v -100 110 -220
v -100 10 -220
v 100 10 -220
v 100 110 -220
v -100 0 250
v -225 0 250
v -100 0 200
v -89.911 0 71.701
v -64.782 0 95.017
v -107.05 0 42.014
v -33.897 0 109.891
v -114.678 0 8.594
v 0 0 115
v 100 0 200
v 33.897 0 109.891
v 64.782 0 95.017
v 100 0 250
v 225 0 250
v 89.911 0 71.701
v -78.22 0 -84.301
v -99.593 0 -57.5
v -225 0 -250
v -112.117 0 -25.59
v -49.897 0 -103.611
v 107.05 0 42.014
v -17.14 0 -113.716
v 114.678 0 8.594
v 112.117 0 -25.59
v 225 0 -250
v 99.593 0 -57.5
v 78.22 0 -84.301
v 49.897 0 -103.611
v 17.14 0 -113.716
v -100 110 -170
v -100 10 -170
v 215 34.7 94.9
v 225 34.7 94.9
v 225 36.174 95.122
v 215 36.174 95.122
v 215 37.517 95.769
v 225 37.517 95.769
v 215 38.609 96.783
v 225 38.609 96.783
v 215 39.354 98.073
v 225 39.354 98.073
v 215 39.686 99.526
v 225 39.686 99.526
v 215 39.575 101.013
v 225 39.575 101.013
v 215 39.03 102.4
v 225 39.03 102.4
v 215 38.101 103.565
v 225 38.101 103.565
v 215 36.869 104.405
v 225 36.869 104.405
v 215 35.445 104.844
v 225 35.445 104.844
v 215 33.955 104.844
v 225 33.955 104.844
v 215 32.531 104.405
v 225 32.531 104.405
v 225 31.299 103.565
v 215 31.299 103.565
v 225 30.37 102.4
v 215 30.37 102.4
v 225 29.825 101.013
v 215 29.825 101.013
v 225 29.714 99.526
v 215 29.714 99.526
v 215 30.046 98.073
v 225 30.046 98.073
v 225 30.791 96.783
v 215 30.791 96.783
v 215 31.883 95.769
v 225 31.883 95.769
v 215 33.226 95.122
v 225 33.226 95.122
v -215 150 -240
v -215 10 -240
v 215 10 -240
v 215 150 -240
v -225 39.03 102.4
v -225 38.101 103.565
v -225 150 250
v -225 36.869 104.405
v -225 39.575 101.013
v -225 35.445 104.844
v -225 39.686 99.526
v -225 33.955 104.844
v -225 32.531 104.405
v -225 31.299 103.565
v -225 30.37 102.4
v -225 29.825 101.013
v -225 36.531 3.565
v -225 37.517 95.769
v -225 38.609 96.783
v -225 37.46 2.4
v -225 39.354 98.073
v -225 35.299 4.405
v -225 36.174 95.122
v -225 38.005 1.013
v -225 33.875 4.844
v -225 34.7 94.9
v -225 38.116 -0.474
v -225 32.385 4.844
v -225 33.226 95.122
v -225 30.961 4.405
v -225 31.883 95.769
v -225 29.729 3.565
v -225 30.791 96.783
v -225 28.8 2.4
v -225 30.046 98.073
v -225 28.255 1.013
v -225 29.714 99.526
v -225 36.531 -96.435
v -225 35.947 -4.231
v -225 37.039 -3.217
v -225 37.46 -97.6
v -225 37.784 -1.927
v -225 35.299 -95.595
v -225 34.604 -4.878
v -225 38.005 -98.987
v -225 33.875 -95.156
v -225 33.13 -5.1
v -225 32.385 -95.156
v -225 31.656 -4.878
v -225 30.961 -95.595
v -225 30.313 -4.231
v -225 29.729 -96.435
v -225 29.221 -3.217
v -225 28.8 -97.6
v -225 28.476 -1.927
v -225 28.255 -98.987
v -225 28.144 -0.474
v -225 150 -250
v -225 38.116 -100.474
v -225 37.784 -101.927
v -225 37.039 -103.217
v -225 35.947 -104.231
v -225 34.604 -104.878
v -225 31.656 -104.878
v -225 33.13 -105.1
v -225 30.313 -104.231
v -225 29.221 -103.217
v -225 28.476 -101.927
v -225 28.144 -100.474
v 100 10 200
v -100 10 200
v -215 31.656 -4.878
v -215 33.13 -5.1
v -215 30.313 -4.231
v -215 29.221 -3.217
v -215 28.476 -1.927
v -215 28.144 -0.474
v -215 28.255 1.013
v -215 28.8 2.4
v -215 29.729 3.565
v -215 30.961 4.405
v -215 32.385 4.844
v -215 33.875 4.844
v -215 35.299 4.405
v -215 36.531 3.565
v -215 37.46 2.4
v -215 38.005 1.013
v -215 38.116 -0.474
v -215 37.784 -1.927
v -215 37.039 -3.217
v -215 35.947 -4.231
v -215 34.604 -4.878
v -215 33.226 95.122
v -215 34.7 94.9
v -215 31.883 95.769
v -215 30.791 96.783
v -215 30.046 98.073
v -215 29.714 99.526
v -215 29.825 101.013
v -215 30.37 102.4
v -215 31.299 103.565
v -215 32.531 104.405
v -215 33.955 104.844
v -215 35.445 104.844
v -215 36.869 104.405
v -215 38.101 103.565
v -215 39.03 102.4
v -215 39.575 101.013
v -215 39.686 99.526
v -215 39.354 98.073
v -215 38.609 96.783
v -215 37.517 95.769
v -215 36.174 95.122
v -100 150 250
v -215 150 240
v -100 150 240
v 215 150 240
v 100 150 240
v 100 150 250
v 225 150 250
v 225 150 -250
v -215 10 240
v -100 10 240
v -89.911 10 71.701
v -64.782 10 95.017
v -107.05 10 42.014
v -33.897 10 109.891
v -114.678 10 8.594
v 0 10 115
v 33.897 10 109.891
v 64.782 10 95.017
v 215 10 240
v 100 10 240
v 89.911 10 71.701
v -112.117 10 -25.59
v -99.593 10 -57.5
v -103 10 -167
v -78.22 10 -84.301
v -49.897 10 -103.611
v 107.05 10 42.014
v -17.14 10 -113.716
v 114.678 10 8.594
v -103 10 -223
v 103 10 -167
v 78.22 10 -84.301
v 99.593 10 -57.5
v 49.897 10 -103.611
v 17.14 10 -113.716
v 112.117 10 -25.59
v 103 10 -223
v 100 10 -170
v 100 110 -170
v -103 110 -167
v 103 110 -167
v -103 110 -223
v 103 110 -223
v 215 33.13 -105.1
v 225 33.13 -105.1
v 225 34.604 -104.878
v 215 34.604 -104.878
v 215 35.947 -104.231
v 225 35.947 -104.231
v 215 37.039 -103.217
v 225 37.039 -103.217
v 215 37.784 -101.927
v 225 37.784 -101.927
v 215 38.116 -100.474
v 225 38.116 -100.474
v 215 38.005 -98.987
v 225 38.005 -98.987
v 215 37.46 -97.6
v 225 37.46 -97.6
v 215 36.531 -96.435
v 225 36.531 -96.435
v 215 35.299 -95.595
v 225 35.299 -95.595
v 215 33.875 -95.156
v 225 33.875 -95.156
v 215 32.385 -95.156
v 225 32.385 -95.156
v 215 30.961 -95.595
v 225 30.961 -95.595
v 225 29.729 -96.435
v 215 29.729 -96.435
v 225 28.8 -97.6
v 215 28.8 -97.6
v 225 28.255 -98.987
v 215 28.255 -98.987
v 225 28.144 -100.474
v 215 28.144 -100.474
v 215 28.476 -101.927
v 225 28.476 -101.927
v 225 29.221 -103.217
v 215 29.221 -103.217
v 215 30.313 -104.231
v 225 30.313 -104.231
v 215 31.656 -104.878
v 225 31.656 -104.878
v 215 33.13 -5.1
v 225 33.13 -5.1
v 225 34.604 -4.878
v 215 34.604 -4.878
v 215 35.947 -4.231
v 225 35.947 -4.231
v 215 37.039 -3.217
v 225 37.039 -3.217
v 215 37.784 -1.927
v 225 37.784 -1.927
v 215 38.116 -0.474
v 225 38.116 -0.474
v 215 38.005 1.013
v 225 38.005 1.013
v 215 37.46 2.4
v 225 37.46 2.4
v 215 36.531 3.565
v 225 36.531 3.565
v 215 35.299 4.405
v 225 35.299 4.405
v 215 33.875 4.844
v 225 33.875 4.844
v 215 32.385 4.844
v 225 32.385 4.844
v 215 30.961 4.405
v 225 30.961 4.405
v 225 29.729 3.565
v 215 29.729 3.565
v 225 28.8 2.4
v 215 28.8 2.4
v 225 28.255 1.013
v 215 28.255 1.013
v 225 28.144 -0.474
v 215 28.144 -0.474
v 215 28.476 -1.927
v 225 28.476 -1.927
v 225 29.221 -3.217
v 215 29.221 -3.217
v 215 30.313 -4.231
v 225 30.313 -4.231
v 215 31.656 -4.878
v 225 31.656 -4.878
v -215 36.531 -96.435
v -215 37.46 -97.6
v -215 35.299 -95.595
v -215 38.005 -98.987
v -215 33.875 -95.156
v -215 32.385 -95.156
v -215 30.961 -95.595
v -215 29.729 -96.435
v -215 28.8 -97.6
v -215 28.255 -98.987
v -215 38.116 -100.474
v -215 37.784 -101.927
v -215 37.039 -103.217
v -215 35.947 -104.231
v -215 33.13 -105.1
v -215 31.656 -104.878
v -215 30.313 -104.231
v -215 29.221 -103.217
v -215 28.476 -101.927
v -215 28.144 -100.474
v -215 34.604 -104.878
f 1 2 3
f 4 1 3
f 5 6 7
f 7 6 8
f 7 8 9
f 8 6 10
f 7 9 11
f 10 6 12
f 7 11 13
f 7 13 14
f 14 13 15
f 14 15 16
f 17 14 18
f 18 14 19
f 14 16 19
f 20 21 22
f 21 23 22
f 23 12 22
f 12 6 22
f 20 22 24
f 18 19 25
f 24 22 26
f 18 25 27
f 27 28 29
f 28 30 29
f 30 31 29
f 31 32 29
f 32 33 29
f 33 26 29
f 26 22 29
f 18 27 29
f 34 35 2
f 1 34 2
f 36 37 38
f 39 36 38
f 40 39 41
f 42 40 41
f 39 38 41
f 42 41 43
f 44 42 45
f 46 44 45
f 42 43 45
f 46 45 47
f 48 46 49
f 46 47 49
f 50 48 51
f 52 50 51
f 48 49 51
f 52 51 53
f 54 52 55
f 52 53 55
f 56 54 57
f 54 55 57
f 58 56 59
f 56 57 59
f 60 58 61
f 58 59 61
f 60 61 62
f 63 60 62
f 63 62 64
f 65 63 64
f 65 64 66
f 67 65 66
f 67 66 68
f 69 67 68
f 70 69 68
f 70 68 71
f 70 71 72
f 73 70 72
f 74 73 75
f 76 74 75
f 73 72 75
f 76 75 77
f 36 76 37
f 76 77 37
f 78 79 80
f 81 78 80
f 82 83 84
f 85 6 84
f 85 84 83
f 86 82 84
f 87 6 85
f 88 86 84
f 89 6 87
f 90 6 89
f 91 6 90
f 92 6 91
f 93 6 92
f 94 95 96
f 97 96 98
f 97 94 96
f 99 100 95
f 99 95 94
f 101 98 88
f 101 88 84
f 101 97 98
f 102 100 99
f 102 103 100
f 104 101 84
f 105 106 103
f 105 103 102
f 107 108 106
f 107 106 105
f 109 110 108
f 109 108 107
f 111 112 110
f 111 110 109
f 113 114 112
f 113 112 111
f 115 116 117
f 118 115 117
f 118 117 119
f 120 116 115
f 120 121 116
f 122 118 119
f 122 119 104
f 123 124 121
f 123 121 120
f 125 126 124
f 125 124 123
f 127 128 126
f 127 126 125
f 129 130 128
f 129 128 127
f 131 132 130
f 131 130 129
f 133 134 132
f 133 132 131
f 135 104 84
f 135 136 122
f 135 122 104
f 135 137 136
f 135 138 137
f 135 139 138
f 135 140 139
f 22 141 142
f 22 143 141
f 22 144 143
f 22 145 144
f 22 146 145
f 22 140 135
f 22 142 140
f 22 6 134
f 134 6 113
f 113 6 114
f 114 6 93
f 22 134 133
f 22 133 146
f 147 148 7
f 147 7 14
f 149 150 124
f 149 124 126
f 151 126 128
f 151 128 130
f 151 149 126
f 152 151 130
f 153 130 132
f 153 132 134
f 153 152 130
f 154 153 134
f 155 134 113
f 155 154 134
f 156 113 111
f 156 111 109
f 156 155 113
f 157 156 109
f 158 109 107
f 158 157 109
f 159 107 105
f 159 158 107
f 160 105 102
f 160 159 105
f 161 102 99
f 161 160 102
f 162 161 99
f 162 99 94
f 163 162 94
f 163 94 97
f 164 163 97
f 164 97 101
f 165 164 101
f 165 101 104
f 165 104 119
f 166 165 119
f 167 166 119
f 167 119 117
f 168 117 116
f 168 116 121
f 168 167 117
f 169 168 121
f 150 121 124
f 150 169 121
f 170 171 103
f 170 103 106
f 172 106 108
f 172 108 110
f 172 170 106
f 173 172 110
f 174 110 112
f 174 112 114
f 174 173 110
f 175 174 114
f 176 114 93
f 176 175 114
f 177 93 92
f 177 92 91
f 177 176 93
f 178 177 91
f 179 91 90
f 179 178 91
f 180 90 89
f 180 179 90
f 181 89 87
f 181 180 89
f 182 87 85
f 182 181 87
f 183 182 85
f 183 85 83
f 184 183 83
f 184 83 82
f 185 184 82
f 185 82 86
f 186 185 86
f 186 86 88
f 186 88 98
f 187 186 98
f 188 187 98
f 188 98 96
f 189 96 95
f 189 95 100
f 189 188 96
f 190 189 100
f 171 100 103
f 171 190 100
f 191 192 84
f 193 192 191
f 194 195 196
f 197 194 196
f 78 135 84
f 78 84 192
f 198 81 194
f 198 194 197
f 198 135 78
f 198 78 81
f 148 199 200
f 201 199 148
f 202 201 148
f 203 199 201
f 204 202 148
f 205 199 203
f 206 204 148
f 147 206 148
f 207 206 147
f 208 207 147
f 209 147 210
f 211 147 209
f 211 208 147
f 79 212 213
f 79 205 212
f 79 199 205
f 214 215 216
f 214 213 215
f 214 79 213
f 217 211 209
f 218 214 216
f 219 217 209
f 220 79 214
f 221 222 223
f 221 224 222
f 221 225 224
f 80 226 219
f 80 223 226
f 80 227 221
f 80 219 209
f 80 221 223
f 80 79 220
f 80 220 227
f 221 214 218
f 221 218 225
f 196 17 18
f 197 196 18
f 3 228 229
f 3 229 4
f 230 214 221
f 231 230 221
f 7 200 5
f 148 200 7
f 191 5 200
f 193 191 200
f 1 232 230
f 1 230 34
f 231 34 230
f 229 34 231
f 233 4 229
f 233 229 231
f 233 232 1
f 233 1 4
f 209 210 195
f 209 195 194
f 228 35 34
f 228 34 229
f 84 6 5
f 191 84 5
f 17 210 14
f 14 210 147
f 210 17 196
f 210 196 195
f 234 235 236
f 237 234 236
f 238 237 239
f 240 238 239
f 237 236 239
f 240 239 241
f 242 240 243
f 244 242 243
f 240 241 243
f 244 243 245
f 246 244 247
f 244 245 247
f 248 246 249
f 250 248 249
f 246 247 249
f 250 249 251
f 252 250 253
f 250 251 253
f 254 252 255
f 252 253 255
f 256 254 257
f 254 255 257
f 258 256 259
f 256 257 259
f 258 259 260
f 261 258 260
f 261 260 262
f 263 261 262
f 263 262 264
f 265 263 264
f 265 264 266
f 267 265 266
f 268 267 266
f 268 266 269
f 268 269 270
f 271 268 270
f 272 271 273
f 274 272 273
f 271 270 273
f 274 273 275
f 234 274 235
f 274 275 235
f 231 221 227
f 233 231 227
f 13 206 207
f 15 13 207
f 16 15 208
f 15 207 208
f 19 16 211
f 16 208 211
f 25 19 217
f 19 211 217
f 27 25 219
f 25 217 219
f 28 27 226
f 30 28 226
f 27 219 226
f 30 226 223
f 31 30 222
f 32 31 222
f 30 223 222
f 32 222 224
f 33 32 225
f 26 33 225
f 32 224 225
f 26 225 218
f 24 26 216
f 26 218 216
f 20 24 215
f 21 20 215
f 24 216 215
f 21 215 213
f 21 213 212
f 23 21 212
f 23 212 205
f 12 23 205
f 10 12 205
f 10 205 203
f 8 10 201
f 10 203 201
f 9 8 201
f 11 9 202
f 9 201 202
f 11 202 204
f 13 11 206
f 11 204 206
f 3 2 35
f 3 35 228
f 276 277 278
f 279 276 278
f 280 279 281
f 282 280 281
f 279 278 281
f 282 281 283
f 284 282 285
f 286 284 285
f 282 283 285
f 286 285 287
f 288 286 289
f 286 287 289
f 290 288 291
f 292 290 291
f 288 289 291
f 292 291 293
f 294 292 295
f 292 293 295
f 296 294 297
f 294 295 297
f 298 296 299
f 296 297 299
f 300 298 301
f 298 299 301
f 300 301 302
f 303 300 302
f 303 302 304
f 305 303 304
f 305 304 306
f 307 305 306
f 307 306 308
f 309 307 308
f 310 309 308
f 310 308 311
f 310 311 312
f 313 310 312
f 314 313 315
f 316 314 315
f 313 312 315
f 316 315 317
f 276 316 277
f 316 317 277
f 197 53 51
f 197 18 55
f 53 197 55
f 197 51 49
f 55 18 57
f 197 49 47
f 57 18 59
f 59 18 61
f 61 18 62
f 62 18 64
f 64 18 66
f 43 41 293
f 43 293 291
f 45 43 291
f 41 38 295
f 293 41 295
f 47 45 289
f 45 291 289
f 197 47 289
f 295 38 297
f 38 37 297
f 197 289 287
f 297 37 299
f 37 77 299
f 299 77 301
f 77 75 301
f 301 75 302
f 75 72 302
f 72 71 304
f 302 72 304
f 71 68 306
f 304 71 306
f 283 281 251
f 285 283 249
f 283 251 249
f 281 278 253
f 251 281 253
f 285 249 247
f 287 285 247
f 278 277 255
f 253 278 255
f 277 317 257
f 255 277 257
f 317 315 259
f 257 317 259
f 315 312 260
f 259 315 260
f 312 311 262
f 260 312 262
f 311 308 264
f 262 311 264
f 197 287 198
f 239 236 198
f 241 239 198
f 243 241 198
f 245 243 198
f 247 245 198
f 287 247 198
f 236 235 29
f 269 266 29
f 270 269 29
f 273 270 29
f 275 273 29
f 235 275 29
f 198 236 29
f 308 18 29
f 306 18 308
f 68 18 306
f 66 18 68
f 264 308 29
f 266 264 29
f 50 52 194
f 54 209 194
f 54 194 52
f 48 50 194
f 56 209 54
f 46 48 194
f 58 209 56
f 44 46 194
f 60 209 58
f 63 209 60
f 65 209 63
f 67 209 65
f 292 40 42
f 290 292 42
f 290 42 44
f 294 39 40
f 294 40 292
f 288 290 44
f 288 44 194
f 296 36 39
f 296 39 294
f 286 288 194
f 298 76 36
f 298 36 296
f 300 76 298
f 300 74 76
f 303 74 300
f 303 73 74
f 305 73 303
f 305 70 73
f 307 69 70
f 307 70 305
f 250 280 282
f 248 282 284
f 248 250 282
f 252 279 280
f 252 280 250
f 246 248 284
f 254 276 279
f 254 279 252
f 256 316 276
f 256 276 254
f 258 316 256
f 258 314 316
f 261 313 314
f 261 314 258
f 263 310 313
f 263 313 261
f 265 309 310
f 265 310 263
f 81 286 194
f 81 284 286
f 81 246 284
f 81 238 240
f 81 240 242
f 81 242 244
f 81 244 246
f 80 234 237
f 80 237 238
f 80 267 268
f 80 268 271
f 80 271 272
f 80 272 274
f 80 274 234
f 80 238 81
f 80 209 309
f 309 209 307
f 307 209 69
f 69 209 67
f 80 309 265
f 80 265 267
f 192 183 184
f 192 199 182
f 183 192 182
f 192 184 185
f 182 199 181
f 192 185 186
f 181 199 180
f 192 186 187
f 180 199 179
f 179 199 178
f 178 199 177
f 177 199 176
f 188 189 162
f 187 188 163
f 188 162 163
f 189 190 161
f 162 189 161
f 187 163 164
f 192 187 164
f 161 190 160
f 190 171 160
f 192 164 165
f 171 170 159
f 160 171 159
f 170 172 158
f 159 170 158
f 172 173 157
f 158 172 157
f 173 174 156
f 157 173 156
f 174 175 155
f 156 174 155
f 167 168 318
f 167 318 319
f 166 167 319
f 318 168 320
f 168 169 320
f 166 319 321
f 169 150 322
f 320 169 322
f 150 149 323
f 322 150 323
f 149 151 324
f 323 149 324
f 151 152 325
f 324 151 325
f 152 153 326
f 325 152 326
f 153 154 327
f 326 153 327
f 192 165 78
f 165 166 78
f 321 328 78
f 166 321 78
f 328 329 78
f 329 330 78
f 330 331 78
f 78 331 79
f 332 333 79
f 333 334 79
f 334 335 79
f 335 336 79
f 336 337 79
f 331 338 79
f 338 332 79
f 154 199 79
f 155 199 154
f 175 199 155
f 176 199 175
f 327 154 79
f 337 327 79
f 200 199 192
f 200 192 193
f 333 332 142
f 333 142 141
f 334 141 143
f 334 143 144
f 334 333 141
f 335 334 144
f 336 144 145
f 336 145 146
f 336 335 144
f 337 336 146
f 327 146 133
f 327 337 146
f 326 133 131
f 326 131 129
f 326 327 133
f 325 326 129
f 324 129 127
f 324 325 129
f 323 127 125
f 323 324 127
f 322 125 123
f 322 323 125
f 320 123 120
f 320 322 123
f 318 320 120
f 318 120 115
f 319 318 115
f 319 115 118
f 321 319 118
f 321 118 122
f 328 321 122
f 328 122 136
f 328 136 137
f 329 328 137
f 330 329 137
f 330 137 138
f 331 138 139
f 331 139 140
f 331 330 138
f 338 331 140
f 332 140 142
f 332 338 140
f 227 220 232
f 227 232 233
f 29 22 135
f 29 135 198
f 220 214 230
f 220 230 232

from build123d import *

# Parameters (mm, degrees)
SKETCH1_W           = 450
SKETCH1_H           = 500
BOSS_EXTRUDE1_DEPTH = 10
SKETCH2_W           = 450
SKETCH2_H           = 500
SKETCH2_W_2         = 430
SKETCH2_H_2         = 480
BOSS_EXTRUDE2_DEPTH = 140
SKETCH3_R           = 115
CUT_EXTRUDE1_DEPTH  = 10
SKETCH5_W           = 200
SKETCH5_H           = 100
CUT_EXTRUDE3_DEPTH  = 369.272996566
SKETCH6_R           = 5
CUT_EXTRUDE4_DEPTH  = 10
CUT_EXTRUDE5_START  = -10
SKETCH7_R           = 5
CUT_EXTRUDE5_DEPTH  = 10
SKETCH8_W           = 206
SKETCH8_H           = 56
SKETCH8_W_2         = 200
SKETCH8_H_2         = 50
BOSS_EXTRUDE3_DEPTH = 100


with BuildPart() as part:
    # Sketch1 → Boss-Extrude1 (new body)
    with BuildSketch(Plane(origin=(0, 0, 0), x_dir=(1, 0, 0), z_dir=(0, 1, 0))):
        Rectangle(SKETCH1_W, SKETCH1_H)
    extrude(amount=BOSS_EXTRUDE1_DEPTH)

    # Sketch2 → Boss-Extrude2 (add)
    with BuildSketch(Plane(origin=(0, 10, 0), x_dir=(1, 0, 0), z_dir=(0, 1, 0))):
        Rectangle(SKETCH2_W, SKETCH2_H)
        Rectangle(SKETCH2_W_2, SKETCH2_H_2, mode=Mode.SUBTRACT)
    extrude(amount=BOSS_EXTRUDE2_DEPTH)

    # Sketch3 → Cut-Extrude1 (cut)
    with BuildSketch(Plane(origin=(0, 10, 0), x_dir=(1, 0, 0), z_dir=(0, 1, 0))):
        with Locations(Location((0, 0, 0), (0, 0, 270))):
            Circle(SKETCH3_R)
    extrude(amount=-CUT_EXTRUDE1_DEPTH, mode=Mode.SUBTRACT)

    # Sketch5 → Cut-Extrude3 (cut, through all)
    with BuildSketch(Plane(origin=(0, 150, 0), x_dir=(1, 0, 0), z_dir=(0, 1, 0))):
        with Locations((0, -250)):
            Rectangle(SKETCH5_W, SKETCH5_H)
    extrude(amount=-CUT_EXTRUDE3_DEPTH, mode=Mode.SUBTRACT)

    # Sketch6 → Cut-Extrude4 (cut)
    with BuildSketch(Plane(origin=(225, 0, 0), x_dir=(0, 0, -1), z_dir=(1, 0, 0))):
        with Locations((-99.9, 34.7)):
            Circle(SKETCH6_R)
        with Locations((0.1, 33.13)):
            Circle(SKETCH6_R)
        with Locations((100.1, 33.13)):
            Circle(SKETCH6_R)
    extrude(amount=-CUT_EXTRUDE4_DEPTH, mode=Mode.SUBTRACT)

    # Sketch7 → Cut-Extrude5 (cut)
    with BuildSketch(Plane.ZY.offset(225).offset(CUT_EXTRUDE5_START)):
        with Locations(Location((-100.1, 33.13, 0), (0, 0, 180))):
            Circle(SKETCH7_R)
        with Locations(Location((-0.1, 33.13, 0), (0, 0, 180))):
            Circle(SKETCH7_R)
        with Locations(Location((99.9, 34.7, 0), (0, 0, 180))):
            Circle(SKETCH7_R)
    extrude(amount=CUT_EXTRUDE5_DEPTH, mode=Mode.SUBTRACT)

    # Sketch8 → Boss-Extrude3 (add)
    with BuildSketch(Plane(origin=(0, 10, 0), x_dir=(1, 0, 0), z_dir=(0, 1, 0))):
        with Locations((0, 195)):
            Rectangle(SKETCH8_W, SKETCH8_H)
        with Locations((0, 195)):
            Rectangle(SKETCH8_W_2, SKETCH8_H_2, mode=Mode.SUBTRACT)
    extrude(amount=BOSS_EXTRUDE3_DEPTH)


solid = part.part
